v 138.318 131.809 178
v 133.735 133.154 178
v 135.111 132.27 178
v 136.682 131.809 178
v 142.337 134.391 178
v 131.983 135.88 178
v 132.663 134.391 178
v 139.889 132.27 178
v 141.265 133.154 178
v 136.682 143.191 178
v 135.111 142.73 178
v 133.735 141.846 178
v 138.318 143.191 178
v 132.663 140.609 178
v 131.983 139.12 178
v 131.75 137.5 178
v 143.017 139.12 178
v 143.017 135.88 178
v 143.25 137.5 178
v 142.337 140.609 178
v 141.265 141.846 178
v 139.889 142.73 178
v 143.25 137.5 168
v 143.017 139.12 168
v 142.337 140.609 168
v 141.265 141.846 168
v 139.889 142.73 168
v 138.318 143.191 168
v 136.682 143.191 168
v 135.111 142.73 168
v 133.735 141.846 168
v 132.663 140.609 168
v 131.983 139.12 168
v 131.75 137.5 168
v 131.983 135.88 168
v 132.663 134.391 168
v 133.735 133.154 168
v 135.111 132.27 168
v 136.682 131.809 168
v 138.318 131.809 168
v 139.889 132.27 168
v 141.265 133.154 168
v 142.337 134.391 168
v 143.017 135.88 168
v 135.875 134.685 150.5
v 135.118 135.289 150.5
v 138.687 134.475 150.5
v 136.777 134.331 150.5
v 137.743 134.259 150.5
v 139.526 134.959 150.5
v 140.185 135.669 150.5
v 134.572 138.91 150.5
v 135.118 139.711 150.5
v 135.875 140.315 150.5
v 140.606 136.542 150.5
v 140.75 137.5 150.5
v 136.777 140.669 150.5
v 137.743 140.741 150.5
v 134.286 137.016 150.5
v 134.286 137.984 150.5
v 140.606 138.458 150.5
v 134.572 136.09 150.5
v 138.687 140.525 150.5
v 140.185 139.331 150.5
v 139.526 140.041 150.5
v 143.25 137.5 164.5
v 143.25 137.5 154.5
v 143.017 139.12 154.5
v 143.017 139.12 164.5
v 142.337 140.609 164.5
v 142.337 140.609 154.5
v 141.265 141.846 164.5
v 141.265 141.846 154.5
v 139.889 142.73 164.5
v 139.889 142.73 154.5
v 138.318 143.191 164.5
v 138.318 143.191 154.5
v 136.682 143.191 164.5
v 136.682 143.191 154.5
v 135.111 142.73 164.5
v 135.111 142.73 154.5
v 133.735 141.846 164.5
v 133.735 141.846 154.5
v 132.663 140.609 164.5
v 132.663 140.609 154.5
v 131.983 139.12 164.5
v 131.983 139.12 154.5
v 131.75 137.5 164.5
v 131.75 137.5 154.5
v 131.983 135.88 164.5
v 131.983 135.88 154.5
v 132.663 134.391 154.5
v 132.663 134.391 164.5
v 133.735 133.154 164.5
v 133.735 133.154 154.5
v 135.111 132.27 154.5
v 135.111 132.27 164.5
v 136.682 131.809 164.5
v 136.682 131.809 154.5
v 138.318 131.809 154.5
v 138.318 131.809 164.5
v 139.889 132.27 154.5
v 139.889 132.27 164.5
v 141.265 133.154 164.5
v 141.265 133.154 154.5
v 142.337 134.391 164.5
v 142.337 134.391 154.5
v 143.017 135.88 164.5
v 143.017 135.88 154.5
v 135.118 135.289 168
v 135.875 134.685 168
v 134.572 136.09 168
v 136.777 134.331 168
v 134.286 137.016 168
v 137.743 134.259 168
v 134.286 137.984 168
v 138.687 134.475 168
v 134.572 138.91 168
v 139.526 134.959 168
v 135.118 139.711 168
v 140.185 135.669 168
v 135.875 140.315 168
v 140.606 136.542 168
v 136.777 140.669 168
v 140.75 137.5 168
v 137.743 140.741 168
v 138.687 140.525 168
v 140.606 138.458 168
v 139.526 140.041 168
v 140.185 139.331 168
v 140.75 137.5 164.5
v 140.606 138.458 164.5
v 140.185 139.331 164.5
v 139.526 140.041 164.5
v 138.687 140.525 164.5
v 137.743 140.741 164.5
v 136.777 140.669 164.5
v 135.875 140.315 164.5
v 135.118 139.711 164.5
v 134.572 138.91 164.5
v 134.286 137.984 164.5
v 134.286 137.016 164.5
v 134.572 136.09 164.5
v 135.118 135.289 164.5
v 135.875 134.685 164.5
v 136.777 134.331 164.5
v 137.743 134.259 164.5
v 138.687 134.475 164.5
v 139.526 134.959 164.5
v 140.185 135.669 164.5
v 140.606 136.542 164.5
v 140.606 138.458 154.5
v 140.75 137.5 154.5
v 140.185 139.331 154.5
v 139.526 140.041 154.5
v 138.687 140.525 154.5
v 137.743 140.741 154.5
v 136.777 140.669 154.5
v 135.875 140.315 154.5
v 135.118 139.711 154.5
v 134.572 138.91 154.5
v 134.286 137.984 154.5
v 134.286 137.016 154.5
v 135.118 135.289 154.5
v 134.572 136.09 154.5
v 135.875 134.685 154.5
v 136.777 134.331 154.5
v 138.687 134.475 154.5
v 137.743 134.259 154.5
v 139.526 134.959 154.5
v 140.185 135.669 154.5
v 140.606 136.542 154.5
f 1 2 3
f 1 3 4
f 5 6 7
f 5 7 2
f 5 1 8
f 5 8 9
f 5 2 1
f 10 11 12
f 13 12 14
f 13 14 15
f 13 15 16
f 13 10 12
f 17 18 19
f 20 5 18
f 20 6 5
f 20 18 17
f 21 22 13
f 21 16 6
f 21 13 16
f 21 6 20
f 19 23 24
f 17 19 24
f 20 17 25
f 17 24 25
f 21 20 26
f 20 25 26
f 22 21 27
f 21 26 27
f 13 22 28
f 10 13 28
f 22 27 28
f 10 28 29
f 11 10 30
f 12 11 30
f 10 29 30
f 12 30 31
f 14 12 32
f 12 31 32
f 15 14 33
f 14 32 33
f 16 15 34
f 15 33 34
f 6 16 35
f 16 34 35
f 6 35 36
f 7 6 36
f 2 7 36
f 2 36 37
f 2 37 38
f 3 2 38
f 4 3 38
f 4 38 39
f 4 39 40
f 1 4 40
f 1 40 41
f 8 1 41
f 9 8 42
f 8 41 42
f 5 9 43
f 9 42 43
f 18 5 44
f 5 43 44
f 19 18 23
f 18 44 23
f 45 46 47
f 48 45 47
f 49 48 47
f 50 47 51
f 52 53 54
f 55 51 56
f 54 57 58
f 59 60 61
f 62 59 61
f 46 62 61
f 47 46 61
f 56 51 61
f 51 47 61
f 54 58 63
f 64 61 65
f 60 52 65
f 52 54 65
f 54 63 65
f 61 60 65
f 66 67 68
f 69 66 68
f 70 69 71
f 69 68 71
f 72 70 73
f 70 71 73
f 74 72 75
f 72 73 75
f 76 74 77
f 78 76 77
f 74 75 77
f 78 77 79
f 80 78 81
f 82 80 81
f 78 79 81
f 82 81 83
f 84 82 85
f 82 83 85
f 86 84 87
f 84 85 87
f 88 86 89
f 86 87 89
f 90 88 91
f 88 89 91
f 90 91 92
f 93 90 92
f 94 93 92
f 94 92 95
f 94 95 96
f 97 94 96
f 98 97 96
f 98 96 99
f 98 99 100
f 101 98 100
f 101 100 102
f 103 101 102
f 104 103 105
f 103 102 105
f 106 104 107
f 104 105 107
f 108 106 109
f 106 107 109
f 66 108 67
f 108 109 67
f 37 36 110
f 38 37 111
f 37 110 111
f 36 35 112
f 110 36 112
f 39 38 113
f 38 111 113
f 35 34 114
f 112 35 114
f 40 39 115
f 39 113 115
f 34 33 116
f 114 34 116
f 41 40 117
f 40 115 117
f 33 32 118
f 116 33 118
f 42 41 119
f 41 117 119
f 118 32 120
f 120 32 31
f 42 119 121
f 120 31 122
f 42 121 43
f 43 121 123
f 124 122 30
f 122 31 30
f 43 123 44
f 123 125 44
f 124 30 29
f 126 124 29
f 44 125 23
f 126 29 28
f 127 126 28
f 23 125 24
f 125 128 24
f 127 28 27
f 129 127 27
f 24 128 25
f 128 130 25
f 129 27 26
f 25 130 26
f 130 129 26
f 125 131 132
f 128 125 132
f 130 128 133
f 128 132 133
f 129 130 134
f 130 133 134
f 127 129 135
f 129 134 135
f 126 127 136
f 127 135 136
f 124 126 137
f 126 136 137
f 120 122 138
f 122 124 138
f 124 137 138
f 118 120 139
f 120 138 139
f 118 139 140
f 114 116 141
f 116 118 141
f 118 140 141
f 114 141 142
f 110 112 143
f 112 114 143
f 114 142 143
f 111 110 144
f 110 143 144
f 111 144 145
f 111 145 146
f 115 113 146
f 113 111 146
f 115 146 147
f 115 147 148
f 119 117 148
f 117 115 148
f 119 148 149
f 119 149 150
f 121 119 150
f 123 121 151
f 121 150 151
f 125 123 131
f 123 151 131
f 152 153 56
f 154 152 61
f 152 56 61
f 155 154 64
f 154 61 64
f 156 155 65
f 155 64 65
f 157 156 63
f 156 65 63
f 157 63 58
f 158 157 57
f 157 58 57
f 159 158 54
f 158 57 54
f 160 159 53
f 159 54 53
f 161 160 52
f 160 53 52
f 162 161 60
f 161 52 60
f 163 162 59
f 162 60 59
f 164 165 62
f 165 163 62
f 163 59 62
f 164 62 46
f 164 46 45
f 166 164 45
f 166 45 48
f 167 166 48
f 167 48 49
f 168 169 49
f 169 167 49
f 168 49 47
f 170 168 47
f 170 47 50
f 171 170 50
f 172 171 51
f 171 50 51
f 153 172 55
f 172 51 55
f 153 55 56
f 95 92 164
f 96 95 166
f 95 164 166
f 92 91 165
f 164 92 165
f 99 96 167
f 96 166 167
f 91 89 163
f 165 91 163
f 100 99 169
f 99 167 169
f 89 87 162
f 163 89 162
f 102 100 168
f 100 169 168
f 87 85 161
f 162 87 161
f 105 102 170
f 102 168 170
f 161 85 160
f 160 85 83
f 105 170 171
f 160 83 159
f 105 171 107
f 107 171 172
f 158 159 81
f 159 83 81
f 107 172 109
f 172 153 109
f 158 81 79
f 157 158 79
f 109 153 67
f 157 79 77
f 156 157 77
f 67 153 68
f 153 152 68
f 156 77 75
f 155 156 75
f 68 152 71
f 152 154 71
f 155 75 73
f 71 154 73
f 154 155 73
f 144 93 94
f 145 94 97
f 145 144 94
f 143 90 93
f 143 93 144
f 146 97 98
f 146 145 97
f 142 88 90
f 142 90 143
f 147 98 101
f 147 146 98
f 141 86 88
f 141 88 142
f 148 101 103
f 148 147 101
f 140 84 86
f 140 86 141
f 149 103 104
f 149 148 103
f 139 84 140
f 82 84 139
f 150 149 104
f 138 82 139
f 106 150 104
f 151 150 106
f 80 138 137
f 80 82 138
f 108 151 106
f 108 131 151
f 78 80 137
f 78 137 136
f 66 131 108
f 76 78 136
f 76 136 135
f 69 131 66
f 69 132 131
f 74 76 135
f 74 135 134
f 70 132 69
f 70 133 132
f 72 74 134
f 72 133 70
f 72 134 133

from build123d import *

# Parameters (mm, degrees)
CYLINDER037_R     = 5.75
CYLINDER037_DEPTH = 10
CYLINDER036_R     = 3.25
CYLINDER036_DEPTH = 10
CYLINDER035_R     = 5.75
CYLINDER035_DEPTH = 10
CYLINDER034_R     = 3.25
CYLINDER034_DEPTH = 10


with BuildPart() as antennain009:
    # Cylinder037 → Cylinder037 (new body)
    with BuildSketch(Plane(origin=(-23, 0, 69), x_dir=(1, 0, 0), z_dir=(0, 0, 1))):
        Circle(CYLINDER037_R)
    extrude(amount=CYLINDER037_DEPTH)


with BuildPart() as fusion012:
    # Cylinder036 → Cylinder036 (new body)
    with BuildSketch(Plane(origin=(-23, 0, 65), x_dir=(1, 0, 0), z_dir=(0, 0, 1))):
        Circle(CYLINDER036_R)
    extrude(amount=CYLINDER036_DEPTH)

    # Fusion012: union antennaIn009
    add(antennain009.part)


with BuildPart() as fusion012_1:
    # Fusion012 placement: moved
    add(fusion012.part.moved(Location((2.5, -25, -19.5))))


with BuildPart() as antennain007:
    # Cylinder035 → Cylinder035 (new body)
    with BuildSketch(Plane(origin=(-23, 0, 69), x_dir=(1, 0, 0), z_dir=(0, 0, 1))):
        Circle(CYLINDER035_R)
    extrude(amount=CYLINDER035_DEPTH)


with BuildPart() as antennacuts001:
    # Cylinder034 → Cylinder034 (new body)
    with BuildSketch(Plane(origin=(-23, 0, 65), x_dir=(1, 0, 0), z_dir=(0, 0, 1))):
        Circle(CYLINDER034_R)
    extrude(amount=CYLINDER034_DEPTH)

    # Fusion011: union antennaIn007
    add(antennain007.part)


with BuildPart() as antennacuts001_1:
    # Fusion011 placement: moved
    add(antennacuts001.part.moved(Location((2.5, -25, -6))))

    # Fusion013: union Fusion012
    add(fusion012_1.part)


with BuildPart() as antennacuts001_2:
    # Fusion013 placement: moved
    add(antennacuts001_1.part.moved(Location((158, 162.5, 105))))


solid = antennacuts001_2.part
